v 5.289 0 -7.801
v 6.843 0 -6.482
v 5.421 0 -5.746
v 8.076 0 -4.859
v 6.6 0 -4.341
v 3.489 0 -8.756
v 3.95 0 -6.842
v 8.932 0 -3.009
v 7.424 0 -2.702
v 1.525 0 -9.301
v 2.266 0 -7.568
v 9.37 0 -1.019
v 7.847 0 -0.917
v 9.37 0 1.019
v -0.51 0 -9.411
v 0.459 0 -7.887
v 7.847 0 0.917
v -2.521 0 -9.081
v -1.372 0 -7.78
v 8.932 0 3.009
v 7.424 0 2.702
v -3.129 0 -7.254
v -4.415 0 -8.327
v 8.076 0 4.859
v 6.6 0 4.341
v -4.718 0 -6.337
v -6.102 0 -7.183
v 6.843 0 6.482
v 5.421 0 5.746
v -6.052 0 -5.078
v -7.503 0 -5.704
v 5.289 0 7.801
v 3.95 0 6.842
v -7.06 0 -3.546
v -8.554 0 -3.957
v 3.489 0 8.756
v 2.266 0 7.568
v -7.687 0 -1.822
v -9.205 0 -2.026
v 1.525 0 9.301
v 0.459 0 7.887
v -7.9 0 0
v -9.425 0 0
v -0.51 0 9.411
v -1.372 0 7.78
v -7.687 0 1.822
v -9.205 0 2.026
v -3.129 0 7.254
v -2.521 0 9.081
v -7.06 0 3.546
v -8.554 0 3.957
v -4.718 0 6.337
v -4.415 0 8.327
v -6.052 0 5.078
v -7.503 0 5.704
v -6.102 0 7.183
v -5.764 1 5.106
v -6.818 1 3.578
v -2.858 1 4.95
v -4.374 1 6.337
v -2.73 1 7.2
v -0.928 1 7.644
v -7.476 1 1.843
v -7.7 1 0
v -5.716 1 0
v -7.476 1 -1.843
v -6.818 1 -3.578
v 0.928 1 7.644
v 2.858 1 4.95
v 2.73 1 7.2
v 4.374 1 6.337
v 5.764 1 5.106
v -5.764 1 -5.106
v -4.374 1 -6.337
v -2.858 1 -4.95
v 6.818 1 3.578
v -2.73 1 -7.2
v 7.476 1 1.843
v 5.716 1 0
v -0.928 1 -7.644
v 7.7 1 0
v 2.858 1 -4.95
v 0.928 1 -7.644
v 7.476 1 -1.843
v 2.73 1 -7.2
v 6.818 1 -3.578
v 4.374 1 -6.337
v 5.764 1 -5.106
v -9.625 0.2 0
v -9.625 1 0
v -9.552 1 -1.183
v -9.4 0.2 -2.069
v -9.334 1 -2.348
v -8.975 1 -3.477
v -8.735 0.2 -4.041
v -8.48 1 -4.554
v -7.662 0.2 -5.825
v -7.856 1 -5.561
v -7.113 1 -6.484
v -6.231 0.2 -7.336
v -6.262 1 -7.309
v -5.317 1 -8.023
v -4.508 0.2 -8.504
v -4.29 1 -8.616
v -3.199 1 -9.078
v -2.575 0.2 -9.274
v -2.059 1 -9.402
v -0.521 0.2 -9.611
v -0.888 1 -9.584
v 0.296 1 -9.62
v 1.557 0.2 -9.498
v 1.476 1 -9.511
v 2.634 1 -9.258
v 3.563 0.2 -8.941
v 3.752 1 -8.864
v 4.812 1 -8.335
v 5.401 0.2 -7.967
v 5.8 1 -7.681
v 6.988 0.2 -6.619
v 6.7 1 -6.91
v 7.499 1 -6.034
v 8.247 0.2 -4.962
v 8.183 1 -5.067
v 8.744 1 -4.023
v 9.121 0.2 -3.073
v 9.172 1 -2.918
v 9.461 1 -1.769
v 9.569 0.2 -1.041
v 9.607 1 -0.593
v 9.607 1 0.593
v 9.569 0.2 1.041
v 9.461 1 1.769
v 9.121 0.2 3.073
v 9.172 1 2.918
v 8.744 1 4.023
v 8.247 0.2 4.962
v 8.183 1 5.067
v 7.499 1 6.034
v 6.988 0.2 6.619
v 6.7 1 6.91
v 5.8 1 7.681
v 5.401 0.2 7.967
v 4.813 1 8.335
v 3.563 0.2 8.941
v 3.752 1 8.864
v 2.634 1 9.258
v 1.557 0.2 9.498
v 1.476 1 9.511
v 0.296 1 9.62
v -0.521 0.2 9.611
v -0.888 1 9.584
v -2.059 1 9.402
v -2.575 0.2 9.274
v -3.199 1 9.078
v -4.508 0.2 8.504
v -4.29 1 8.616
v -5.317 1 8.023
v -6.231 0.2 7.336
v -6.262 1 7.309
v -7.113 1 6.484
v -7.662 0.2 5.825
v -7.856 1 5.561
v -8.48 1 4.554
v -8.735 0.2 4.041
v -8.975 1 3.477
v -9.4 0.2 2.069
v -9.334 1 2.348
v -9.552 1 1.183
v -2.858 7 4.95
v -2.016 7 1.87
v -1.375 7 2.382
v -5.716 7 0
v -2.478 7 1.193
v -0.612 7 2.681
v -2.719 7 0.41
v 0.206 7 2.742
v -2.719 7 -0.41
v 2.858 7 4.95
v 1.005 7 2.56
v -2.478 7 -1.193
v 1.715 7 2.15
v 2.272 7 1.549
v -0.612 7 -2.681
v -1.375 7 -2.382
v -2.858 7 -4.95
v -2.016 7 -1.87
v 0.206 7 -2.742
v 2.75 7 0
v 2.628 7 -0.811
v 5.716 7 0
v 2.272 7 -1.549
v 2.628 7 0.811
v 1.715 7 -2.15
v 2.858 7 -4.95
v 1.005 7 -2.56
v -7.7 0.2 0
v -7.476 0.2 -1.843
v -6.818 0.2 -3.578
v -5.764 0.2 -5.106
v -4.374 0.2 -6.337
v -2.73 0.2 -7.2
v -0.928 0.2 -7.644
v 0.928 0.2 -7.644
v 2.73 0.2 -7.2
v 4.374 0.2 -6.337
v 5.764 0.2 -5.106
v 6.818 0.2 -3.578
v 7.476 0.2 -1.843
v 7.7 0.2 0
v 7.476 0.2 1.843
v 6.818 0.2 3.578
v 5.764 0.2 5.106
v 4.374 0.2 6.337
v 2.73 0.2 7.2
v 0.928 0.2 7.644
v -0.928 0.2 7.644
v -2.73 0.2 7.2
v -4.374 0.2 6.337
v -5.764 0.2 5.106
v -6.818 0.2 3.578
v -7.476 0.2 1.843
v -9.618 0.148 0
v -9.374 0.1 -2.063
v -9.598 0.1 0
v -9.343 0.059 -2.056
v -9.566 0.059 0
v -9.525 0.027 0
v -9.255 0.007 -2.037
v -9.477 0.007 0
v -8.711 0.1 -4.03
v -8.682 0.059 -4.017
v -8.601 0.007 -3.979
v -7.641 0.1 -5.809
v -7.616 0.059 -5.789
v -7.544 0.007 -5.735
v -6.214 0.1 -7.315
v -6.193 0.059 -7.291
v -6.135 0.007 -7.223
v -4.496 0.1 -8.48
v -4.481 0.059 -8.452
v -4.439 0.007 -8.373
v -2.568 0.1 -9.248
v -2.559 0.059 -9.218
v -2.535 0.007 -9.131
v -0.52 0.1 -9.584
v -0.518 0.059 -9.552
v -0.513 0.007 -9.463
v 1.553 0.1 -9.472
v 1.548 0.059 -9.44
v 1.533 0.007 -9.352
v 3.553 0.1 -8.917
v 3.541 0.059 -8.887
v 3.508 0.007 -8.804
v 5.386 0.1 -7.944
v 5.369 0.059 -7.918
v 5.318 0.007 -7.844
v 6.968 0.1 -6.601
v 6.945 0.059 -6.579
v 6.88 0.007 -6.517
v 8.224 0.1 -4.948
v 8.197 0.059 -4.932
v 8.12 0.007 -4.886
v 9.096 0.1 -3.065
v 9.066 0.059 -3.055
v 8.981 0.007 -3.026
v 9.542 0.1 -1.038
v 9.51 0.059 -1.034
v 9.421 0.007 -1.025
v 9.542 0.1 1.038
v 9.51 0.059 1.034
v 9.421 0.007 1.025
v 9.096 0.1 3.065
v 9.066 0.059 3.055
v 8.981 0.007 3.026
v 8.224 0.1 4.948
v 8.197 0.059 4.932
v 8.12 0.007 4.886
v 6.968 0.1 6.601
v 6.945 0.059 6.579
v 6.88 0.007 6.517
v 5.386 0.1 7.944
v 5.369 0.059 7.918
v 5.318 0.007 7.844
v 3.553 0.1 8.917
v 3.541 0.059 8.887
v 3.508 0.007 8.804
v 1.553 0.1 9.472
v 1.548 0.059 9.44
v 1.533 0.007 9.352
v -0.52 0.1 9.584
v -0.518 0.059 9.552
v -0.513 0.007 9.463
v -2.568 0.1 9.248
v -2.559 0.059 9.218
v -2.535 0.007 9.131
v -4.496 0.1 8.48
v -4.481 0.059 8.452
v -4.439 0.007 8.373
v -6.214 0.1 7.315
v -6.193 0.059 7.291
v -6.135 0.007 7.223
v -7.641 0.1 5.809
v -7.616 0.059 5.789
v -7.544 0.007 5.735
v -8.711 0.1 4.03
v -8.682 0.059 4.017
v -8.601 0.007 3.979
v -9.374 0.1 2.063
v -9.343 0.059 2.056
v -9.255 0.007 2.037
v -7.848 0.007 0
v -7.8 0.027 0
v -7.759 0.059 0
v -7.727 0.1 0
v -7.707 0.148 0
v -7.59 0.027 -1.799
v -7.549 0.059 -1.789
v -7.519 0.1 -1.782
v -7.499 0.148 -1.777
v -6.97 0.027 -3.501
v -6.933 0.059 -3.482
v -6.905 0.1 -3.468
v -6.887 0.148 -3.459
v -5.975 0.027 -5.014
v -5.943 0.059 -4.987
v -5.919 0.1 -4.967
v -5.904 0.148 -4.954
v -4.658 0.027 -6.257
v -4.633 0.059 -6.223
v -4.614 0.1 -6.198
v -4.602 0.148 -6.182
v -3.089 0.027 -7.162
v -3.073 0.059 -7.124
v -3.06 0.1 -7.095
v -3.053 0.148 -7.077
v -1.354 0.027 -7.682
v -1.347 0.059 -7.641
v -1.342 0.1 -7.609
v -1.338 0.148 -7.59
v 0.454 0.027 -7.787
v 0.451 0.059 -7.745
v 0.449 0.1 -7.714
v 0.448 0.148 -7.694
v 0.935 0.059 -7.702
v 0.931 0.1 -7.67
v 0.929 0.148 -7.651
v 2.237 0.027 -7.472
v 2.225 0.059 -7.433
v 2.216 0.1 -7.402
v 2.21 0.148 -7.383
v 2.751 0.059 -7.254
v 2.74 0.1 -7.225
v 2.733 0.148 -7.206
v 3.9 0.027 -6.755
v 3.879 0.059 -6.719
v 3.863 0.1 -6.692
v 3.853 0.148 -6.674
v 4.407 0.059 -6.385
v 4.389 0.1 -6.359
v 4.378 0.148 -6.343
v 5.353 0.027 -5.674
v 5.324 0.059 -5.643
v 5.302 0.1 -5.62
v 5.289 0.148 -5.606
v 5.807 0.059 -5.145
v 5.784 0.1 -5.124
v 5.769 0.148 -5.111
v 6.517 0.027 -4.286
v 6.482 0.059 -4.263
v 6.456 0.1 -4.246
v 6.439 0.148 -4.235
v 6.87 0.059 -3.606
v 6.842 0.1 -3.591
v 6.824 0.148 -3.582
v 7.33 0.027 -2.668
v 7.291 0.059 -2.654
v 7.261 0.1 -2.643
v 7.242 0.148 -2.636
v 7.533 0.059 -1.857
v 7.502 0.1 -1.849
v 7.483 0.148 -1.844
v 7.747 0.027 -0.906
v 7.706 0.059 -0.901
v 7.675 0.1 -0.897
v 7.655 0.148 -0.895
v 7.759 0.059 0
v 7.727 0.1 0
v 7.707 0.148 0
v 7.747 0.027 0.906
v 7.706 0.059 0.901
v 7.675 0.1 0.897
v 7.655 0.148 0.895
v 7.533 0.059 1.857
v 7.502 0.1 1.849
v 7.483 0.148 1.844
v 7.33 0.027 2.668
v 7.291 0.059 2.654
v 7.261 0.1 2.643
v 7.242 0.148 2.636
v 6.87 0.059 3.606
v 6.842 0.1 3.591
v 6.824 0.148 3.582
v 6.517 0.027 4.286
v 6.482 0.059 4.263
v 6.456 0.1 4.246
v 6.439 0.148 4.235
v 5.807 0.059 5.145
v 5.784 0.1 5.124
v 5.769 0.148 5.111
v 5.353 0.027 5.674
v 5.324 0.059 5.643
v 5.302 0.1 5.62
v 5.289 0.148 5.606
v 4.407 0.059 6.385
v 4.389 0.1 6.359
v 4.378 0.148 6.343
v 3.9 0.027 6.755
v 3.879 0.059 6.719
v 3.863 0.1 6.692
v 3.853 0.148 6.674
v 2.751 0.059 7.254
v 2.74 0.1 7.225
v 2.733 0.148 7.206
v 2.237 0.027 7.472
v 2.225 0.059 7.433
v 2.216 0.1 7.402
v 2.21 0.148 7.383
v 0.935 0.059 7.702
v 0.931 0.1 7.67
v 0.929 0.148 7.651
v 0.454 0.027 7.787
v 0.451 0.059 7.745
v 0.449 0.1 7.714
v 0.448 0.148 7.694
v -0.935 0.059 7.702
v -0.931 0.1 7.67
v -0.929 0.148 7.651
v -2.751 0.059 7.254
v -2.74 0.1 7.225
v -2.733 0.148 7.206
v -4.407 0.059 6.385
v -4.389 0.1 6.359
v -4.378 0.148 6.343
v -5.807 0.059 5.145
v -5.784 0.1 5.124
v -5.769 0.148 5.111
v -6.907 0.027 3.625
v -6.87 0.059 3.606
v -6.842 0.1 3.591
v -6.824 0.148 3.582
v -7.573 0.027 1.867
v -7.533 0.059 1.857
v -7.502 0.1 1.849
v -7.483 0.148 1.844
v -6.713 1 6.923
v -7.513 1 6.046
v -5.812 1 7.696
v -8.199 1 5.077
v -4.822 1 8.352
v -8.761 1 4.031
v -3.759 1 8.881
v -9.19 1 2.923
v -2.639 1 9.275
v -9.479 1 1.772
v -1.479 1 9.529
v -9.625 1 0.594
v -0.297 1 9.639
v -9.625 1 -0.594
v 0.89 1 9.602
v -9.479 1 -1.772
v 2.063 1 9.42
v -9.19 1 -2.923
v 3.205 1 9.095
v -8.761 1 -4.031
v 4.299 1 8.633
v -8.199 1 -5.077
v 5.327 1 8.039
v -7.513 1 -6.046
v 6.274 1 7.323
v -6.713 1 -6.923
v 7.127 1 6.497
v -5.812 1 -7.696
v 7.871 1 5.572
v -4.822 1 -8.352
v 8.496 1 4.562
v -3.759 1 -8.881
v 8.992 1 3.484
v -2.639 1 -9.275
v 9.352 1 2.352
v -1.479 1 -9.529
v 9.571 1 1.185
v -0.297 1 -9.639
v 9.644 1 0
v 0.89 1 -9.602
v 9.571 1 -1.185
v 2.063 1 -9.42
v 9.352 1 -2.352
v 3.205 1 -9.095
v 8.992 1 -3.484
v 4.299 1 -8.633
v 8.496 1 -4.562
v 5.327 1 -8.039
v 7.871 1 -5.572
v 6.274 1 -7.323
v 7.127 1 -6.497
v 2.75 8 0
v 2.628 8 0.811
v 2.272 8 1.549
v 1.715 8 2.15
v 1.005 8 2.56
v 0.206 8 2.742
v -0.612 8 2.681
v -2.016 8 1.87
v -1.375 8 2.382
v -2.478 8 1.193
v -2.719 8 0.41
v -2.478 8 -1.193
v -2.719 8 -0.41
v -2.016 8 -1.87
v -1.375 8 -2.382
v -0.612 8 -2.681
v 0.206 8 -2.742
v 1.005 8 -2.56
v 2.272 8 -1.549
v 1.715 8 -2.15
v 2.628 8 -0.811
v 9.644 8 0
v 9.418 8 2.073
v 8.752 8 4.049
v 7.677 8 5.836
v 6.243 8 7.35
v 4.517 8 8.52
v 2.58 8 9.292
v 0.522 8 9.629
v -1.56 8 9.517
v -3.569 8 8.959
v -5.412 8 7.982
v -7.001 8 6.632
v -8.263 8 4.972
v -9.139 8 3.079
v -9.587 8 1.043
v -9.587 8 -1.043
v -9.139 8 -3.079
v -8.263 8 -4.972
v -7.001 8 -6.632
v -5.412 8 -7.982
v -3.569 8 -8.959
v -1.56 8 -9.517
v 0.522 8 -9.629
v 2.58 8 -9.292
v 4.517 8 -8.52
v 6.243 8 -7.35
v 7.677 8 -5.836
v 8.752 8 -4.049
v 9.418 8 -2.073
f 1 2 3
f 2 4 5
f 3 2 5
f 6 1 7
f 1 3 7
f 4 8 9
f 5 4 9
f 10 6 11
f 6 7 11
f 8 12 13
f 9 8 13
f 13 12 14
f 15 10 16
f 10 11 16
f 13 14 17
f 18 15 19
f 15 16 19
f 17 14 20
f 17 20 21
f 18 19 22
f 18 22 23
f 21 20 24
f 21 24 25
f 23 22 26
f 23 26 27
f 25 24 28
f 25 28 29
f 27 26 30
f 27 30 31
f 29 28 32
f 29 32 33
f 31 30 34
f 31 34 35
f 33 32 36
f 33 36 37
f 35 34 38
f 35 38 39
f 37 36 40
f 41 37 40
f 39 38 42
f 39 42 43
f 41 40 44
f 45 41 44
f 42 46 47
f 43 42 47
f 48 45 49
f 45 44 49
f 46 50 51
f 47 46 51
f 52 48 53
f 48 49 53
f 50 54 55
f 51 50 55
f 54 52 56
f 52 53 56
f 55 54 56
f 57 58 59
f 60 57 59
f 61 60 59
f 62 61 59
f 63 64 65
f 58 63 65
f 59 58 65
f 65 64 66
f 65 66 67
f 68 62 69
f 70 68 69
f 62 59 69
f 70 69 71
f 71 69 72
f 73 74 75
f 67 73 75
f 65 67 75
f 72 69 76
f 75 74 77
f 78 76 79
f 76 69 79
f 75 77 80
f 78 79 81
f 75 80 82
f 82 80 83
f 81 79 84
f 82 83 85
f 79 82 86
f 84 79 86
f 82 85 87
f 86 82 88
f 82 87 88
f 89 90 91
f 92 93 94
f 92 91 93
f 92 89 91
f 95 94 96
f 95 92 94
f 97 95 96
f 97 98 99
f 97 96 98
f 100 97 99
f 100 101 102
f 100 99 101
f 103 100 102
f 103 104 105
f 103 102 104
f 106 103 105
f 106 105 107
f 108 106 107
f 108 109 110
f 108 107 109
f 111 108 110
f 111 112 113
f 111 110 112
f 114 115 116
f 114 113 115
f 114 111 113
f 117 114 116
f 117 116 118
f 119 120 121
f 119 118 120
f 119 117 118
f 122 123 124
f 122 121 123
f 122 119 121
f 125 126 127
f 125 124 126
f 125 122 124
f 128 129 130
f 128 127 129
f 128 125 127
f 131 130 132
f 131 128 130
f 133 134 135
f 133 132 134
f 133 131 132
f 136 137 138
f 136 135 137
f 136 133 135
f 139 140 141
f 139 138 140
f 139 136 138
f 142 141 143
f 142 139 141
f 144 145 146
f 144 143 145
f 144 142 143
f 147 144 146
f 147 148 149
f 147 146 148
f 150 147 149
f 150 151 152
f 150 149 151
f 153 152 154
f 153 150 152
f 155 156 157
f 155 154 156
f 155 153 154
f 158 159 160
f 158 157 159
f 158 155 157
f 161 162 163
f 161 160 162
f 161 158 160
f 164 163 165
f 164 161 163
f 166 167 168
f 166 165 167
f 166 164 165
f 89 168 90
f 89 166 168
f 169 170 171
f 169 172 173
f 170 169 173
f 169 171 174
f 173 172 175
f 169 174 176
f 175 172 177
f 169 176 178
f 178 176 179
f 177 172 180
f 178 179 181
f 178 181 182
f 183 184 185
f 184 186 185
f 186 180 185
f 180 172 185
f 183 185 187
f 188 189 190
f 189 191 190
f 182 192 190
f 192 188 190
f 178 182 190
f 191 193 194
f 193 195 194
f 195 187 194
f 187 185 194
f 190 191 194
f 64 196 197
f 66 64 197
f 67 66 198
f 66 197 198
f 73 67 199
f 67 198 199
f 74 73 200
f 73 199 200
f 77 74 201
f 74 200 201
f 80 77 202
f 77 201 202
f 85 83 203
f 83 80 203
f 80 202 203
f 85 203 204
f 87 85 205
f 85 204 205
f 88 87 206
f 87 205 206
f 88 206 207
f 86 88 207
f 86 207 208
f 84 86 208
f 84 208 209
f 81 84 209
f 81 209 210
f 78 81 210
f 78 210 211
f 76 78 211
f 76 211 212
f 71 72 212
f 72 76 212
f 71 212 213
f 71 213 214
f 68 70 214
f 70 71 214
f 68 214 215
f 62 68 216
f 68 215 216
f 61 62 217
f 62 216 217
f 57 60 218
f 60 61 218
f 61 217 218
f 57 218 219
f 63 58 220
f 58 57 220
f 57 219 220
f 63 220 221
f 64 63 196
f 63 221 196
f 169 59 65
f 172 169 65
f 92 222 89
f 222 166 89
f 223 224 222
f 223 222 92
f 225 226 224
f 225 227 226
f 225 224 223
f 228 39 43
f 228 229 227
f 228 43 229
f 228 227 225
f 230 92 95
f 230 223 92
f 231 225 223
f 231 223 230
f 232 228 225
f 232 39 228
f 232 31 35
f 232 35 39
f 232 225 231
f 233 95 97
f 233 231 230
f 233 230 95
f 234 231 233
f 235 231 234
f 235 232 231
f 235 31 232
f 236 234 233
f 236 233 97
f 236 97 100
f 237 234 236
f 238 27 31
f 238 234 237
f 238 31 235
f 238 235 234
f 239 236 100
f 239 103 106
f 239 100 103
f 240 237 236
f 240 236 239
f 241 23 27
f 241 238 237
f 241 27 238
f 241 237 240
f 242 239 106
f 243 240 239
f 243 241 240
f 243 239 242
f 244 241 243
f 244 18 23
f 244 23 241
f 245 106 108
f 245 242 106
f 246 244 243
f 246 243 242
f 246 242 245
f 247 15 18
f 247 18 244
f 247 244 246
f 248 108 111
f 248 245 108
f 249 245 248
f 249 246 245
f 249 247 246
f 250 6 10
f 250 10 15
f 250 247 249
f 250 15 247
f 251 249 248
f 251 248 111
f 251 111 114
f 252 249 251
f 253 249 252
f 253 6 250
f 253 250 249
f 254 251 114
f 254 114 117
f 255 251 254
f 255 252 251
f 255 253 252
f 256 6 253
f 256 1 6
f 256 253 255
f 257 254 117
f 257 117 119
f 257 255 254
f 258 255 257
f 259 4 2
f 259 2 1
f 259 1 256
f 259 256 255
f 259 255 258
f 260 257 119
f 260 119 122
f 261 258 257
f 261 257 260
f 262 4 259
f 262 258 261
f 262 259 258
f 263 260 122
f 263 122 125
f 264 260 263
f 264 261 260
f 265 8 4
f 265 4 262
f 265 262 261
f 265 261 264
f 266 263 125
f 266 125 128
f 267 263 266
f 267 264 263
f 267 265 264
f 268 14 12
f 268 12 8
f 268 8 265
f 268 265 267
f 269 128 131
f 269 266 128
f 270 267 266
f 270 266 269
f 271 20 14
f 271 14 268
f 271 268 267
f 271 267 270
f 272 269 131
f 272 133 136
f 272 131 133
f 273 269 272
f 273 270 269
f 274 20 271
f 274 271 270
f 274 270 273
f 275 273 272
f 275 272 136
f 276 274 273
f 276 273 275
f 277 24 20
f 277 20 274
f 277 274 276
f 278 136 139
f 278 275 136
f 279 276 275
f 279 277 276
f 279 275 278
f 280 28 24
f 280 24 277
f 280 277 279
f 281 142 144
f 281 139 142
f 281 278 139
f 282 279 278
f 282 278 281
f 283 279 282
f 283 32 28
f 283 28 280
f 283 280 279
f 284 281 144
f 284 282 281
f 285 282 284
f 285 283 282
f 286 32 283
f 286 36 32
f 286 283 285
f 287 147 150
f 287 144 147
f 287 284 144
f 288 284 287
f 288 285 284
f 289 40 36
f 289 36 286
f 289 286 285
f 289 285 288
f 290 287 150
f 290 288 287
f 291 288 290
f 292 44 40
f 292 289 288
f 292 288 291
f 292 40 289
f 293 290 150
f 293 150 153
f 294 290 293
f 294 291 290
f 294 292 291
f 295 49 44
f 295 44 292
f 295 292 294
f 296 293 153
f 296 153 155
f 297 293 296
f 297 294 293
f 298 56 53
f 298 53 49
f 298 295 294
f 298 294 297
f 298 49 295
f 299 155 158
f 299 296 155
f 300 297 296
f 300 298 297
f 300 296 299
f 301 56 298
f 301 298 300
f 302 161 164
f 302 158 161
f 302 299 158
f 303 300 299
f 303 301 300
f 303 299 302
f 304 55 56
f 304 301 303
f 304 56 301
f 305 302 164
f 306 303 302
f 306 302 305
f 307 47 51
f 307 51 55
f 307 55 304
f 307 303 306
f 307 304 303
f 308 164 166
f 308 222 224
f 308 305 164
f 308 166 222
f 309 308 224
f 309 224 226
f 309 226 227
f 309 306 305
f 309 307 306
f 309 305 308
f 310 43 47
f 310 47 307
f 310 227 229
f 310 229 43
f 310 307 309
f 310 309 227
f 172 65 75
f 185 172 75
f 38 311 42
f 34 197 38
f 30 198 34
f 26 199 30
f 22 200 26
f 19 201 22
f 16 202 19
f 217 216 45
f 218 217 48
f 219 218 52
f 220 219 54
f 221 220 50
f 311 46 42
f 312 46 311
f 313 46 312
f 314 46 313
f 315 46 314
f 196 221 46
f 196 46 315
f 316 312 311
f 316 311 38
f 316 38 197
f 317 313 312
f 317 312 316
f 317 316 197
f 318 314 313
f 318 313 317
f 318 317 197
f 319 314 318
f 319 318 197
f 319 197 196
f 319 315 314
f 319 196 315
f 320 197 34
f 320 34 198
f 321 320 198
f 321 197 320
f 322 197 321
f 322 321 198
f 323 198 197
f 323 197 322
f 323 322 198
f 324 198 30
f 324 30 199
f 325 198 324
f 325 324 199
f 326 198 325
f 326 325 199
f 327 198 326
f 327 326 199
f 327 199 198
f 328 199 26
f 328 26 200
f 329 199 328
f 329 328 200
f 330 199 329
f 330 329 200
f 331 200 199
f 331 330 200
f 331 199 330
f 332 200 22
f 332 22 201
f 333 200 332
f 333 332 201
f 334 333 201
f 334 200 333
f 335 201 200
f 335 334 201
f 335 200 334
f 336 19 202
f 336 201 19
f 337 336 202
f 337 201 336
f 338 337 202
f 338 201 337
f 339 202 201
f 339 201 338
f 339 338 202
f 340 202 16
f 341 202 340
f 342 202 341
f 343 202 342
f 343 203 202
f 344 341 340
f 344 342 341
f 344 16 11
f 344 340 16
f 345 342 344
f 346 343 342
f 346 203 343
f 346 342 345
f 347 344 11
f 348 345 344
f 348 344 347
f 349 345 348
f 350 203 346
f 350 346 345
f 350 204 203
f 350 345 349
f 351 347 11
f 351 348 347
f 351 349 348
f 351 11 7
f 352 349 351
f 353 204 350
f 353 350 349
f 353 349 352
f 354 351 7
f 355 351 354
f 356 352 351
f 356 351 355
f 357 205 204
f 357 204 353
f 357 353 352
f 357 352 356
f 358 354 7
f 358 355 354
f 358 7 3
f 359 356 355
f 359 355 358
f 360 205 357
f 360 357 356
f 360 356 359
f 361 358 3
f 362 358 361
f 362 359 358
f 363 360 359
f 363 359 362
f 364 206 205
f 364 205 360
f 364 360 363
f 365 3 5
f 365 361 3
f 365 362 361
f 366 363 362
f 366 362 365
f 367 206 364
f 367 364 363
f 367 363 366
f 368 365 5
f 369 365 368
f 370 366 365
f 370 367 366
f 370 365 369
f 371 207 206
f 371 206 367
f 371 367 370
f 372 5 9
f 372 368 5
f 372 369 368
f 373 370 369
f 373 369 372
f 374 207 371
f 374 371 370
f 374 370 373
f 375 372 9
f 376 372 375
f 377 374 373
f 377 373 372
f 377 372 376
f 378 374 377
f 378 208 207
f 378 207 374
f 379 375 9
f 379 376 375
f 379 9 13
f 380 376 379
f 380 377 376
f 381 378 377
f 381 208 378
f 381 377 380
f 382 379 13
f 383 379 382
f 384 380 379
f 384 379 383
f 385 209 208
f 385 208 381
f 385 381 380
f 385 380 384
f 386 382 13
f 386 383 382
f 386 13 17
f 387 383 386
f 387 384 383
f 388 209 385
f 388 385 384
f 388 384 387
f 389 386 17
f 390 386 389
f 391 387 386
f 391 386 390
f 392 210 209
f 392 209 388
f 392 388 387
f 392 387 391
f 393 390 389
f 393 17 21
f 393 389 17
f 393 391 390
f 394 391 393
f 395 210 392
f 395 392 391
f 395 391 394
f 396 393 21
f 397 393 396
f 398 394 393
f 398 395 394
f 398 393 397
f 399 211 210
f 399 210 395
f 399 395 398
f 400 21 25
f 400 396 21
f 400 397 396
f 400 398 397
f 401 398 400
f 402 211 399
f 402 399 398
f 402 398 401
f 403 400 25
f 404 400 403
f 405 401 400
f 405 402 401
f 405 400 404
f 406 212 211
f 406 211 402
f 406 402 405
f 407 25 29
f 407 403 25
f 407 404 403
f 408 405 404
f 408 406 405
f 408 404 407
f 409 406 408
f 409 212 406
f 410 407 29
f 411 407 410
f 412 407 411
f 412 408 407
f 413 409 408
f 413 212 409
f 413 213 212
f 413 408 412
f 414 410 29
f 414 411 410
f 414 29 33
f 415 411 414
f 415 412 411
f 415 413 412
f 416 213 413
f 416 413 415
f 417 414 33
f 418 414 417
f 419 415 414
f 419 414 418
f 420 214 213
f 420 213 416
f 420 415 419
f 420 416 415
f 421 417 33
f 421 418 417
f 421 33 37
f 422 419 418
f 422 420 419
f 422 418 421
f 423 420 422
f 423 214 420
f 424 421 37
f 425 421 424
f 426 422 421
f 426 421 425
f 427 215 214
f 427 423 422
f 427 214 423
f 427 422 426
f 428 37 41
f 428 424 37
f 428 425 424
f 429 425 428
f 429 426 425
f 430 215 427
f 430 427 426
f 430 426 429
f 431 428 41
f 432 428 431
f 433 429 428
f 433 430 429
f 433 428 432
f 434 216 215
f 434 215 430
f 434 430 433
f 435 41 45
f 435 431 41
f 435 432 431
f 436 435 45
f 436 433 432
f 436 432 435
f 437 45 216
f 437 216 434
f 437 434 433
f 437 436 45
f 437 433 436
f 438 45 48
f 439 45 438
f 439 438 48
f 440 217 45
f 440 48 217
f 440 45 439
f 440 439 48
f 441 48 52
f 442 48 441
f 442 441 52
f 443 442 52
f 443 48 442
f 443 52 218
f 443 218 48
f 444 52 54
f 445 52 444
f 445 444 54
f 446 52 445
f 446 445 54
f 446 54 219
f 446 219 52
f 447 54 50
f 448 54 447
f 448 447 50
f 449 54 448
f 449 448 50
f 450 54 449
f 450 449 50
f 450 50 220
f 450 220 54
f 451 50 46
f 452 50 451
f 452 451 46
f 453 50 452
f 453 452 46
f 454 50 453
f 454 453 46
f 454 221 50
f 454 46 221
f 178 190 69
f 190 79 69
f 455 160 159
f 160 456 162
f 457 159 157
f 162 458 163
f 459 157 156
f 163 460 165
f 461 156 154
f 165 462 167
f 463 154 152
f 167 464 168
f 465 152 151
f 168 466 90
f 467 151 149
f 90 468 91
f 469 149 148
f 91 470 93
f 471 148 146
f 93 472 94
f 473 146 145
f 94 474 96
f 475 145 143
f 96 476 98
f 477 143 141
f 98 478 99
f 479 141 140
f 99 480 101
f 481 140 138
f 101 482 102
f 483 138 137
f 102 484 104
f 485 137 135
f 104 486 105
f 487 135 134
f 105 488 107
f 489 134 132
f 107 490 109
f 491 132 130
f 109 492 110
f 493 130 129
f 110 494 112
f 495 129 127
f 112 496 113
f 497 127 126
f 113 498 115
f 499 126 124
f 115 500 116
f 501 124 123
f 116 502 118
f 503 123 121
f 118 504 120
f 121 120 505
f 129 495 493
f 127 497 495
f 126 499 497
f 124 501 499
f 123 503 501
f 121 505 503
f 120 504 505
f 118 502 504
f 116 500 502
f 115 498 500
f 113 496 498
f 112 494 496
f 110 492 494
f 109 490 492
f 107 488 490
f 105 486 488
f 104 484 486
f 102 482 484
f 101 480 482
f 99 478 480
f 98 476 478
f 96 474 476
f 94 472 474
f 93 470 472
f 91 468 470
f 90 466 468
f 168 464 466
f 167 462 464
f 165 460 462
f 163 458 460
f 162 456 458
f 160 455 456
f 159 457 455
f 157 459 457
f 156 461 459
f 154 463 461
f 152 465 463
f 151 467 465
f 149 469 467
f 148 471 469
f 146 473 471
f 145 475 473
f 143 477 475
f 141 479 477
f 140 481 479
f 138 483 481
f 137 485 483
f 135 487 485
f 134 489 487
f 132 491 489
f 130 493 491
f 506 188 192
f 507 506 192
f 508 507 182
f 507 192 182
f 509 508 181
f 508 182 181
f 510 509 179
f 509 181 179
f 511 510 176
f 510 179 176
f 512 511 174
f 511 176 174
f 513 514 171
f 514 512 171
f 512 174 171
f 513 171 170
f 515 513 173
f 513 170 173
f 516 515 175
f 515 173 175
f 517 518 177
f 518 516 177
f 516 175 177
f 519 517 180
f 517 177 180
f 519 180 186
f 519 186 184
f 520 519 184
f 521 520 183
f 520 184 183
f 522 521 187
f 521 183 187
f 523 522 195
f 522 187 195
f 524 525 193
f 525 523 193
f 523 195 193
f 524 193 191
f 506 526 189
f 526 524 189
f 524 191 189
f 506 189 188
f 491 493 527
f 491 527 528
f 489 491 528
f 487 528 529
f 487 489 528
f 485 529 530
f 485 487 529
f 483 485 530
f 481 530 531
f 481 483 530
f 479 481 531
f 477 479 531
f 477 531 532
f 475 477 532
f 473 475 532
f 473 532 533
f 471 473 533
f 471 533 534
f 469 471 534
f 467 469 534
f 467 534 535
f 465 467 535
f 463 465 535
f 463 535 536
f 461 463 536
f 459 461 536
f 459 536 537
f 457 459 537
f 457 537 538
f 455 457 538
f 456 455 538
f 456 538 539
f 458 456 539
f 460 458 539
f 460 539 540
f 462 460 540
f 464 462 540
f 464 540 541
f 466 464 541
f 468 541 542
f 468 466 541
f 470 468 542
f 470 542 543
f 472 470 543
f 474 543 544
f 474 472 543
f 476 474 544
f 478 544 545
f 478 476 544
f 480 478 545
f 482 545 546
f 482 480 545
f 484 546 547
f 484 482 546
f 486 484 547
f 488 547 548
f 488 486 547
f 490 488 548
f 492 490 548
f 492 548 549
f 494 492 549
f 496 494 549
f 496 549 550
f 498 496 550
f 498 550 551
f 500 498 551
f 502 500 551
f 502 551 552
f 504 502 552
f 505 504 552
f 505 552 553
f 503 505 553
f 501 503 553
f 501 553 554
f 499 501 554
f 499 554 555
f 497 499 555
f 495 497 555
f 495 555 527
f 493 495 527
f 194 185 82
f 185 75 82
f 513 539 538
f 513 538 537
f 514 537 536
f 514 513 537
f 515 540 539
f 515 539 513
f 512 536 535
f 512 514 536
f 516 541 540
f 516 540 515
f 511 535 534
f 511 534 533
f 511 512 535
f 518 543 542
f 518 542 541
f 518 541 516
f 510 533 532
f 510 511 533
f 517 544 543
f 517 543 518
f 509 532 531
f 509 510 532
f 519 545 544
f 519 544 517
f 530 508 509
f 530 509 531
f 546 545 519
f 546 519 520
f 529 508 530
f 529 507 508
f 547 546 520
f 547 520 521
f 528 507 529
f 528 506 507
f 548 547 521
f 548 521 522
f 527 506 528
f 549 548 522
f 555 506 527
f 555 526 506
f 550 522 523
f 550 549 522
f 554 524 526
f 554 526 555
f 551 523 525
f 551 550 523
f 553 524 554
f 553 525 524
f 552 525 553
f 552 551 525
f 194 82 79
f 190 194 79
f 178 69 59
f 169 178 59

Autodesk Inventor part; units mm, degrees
ref_plane "YZ Plane" through (0, 0, 0) normal (1, 0, 0) x (0, 1, 0)
ref_plane "XZ Plane" through (0, 0, 0) normal (0, 1, 0) x (-1, 0, 0)
ref_plane "XY Plane" through (0, 0, 0) normal (0, 0, 1) x (1, 0, 0)
sketch "Sketch1" plane through (0, 0, 0) normal (0, 1, 0) x (-1, 0, 0)
  circle A0 centre (0, 0) radius 9.625
  circle A1 centre (0, 0) radius 7.7
  dimension "d0" = 19.25
  dimension "d1" = 15.4
extrude "Extrusion1" add sketch "Sketch1" along normal blind 1
sketch "Sketch2" plane through (0, 1, 0) normal (0, 1, 0) x (1, 0, 0)
  circle A0 centre (0, 0) radius 9.6436
  line L0 (-2.8579, 4.95) -> (2.8579, 4.95)
  line L1 (2.8579, 4.95) -> (5.7158, 0)
  line L2 (5.7158, 0) -> (2.8579, -4.95)
  line L3 (2.8579, -4.95) -> (-2.8579, -4.95)
  line L4 (-2.8579, -4.95) -> (-5.7158, 0)
  line L5 (-5.7158, 0) -> (-2.8579, 4.95)
  line L6 (0, 0) -> (0, -3.104)
  line L7 (0, 0) -> (3.104, 0) construction
  dimension "d4" = 9.9
  dimension "d5" = 90
extrude "Extrusion2" add sketch "Sketch2" along normal blind 6
sketch "Sketch3" plane through (0, 7, 0) normal (0, 1, 0) x (1, 0, 0)
  circle A0 centre (0, 0) radius 9.6436
  circle A1 centre (0, 0) radius 2.75
  circle A2 centre (0, 0) radius 9.6436 projected
  dimension "d8" = 5.5
  dimension "d9" = 0
extrude "Extrusion3" add sketch "Sketch3" along normal blind 1
fillet "Fillet1" radius 0.2 2 edges at (9.625, 0, 0) (7.7, 0, 0)
properties part number "NutRetainer"
